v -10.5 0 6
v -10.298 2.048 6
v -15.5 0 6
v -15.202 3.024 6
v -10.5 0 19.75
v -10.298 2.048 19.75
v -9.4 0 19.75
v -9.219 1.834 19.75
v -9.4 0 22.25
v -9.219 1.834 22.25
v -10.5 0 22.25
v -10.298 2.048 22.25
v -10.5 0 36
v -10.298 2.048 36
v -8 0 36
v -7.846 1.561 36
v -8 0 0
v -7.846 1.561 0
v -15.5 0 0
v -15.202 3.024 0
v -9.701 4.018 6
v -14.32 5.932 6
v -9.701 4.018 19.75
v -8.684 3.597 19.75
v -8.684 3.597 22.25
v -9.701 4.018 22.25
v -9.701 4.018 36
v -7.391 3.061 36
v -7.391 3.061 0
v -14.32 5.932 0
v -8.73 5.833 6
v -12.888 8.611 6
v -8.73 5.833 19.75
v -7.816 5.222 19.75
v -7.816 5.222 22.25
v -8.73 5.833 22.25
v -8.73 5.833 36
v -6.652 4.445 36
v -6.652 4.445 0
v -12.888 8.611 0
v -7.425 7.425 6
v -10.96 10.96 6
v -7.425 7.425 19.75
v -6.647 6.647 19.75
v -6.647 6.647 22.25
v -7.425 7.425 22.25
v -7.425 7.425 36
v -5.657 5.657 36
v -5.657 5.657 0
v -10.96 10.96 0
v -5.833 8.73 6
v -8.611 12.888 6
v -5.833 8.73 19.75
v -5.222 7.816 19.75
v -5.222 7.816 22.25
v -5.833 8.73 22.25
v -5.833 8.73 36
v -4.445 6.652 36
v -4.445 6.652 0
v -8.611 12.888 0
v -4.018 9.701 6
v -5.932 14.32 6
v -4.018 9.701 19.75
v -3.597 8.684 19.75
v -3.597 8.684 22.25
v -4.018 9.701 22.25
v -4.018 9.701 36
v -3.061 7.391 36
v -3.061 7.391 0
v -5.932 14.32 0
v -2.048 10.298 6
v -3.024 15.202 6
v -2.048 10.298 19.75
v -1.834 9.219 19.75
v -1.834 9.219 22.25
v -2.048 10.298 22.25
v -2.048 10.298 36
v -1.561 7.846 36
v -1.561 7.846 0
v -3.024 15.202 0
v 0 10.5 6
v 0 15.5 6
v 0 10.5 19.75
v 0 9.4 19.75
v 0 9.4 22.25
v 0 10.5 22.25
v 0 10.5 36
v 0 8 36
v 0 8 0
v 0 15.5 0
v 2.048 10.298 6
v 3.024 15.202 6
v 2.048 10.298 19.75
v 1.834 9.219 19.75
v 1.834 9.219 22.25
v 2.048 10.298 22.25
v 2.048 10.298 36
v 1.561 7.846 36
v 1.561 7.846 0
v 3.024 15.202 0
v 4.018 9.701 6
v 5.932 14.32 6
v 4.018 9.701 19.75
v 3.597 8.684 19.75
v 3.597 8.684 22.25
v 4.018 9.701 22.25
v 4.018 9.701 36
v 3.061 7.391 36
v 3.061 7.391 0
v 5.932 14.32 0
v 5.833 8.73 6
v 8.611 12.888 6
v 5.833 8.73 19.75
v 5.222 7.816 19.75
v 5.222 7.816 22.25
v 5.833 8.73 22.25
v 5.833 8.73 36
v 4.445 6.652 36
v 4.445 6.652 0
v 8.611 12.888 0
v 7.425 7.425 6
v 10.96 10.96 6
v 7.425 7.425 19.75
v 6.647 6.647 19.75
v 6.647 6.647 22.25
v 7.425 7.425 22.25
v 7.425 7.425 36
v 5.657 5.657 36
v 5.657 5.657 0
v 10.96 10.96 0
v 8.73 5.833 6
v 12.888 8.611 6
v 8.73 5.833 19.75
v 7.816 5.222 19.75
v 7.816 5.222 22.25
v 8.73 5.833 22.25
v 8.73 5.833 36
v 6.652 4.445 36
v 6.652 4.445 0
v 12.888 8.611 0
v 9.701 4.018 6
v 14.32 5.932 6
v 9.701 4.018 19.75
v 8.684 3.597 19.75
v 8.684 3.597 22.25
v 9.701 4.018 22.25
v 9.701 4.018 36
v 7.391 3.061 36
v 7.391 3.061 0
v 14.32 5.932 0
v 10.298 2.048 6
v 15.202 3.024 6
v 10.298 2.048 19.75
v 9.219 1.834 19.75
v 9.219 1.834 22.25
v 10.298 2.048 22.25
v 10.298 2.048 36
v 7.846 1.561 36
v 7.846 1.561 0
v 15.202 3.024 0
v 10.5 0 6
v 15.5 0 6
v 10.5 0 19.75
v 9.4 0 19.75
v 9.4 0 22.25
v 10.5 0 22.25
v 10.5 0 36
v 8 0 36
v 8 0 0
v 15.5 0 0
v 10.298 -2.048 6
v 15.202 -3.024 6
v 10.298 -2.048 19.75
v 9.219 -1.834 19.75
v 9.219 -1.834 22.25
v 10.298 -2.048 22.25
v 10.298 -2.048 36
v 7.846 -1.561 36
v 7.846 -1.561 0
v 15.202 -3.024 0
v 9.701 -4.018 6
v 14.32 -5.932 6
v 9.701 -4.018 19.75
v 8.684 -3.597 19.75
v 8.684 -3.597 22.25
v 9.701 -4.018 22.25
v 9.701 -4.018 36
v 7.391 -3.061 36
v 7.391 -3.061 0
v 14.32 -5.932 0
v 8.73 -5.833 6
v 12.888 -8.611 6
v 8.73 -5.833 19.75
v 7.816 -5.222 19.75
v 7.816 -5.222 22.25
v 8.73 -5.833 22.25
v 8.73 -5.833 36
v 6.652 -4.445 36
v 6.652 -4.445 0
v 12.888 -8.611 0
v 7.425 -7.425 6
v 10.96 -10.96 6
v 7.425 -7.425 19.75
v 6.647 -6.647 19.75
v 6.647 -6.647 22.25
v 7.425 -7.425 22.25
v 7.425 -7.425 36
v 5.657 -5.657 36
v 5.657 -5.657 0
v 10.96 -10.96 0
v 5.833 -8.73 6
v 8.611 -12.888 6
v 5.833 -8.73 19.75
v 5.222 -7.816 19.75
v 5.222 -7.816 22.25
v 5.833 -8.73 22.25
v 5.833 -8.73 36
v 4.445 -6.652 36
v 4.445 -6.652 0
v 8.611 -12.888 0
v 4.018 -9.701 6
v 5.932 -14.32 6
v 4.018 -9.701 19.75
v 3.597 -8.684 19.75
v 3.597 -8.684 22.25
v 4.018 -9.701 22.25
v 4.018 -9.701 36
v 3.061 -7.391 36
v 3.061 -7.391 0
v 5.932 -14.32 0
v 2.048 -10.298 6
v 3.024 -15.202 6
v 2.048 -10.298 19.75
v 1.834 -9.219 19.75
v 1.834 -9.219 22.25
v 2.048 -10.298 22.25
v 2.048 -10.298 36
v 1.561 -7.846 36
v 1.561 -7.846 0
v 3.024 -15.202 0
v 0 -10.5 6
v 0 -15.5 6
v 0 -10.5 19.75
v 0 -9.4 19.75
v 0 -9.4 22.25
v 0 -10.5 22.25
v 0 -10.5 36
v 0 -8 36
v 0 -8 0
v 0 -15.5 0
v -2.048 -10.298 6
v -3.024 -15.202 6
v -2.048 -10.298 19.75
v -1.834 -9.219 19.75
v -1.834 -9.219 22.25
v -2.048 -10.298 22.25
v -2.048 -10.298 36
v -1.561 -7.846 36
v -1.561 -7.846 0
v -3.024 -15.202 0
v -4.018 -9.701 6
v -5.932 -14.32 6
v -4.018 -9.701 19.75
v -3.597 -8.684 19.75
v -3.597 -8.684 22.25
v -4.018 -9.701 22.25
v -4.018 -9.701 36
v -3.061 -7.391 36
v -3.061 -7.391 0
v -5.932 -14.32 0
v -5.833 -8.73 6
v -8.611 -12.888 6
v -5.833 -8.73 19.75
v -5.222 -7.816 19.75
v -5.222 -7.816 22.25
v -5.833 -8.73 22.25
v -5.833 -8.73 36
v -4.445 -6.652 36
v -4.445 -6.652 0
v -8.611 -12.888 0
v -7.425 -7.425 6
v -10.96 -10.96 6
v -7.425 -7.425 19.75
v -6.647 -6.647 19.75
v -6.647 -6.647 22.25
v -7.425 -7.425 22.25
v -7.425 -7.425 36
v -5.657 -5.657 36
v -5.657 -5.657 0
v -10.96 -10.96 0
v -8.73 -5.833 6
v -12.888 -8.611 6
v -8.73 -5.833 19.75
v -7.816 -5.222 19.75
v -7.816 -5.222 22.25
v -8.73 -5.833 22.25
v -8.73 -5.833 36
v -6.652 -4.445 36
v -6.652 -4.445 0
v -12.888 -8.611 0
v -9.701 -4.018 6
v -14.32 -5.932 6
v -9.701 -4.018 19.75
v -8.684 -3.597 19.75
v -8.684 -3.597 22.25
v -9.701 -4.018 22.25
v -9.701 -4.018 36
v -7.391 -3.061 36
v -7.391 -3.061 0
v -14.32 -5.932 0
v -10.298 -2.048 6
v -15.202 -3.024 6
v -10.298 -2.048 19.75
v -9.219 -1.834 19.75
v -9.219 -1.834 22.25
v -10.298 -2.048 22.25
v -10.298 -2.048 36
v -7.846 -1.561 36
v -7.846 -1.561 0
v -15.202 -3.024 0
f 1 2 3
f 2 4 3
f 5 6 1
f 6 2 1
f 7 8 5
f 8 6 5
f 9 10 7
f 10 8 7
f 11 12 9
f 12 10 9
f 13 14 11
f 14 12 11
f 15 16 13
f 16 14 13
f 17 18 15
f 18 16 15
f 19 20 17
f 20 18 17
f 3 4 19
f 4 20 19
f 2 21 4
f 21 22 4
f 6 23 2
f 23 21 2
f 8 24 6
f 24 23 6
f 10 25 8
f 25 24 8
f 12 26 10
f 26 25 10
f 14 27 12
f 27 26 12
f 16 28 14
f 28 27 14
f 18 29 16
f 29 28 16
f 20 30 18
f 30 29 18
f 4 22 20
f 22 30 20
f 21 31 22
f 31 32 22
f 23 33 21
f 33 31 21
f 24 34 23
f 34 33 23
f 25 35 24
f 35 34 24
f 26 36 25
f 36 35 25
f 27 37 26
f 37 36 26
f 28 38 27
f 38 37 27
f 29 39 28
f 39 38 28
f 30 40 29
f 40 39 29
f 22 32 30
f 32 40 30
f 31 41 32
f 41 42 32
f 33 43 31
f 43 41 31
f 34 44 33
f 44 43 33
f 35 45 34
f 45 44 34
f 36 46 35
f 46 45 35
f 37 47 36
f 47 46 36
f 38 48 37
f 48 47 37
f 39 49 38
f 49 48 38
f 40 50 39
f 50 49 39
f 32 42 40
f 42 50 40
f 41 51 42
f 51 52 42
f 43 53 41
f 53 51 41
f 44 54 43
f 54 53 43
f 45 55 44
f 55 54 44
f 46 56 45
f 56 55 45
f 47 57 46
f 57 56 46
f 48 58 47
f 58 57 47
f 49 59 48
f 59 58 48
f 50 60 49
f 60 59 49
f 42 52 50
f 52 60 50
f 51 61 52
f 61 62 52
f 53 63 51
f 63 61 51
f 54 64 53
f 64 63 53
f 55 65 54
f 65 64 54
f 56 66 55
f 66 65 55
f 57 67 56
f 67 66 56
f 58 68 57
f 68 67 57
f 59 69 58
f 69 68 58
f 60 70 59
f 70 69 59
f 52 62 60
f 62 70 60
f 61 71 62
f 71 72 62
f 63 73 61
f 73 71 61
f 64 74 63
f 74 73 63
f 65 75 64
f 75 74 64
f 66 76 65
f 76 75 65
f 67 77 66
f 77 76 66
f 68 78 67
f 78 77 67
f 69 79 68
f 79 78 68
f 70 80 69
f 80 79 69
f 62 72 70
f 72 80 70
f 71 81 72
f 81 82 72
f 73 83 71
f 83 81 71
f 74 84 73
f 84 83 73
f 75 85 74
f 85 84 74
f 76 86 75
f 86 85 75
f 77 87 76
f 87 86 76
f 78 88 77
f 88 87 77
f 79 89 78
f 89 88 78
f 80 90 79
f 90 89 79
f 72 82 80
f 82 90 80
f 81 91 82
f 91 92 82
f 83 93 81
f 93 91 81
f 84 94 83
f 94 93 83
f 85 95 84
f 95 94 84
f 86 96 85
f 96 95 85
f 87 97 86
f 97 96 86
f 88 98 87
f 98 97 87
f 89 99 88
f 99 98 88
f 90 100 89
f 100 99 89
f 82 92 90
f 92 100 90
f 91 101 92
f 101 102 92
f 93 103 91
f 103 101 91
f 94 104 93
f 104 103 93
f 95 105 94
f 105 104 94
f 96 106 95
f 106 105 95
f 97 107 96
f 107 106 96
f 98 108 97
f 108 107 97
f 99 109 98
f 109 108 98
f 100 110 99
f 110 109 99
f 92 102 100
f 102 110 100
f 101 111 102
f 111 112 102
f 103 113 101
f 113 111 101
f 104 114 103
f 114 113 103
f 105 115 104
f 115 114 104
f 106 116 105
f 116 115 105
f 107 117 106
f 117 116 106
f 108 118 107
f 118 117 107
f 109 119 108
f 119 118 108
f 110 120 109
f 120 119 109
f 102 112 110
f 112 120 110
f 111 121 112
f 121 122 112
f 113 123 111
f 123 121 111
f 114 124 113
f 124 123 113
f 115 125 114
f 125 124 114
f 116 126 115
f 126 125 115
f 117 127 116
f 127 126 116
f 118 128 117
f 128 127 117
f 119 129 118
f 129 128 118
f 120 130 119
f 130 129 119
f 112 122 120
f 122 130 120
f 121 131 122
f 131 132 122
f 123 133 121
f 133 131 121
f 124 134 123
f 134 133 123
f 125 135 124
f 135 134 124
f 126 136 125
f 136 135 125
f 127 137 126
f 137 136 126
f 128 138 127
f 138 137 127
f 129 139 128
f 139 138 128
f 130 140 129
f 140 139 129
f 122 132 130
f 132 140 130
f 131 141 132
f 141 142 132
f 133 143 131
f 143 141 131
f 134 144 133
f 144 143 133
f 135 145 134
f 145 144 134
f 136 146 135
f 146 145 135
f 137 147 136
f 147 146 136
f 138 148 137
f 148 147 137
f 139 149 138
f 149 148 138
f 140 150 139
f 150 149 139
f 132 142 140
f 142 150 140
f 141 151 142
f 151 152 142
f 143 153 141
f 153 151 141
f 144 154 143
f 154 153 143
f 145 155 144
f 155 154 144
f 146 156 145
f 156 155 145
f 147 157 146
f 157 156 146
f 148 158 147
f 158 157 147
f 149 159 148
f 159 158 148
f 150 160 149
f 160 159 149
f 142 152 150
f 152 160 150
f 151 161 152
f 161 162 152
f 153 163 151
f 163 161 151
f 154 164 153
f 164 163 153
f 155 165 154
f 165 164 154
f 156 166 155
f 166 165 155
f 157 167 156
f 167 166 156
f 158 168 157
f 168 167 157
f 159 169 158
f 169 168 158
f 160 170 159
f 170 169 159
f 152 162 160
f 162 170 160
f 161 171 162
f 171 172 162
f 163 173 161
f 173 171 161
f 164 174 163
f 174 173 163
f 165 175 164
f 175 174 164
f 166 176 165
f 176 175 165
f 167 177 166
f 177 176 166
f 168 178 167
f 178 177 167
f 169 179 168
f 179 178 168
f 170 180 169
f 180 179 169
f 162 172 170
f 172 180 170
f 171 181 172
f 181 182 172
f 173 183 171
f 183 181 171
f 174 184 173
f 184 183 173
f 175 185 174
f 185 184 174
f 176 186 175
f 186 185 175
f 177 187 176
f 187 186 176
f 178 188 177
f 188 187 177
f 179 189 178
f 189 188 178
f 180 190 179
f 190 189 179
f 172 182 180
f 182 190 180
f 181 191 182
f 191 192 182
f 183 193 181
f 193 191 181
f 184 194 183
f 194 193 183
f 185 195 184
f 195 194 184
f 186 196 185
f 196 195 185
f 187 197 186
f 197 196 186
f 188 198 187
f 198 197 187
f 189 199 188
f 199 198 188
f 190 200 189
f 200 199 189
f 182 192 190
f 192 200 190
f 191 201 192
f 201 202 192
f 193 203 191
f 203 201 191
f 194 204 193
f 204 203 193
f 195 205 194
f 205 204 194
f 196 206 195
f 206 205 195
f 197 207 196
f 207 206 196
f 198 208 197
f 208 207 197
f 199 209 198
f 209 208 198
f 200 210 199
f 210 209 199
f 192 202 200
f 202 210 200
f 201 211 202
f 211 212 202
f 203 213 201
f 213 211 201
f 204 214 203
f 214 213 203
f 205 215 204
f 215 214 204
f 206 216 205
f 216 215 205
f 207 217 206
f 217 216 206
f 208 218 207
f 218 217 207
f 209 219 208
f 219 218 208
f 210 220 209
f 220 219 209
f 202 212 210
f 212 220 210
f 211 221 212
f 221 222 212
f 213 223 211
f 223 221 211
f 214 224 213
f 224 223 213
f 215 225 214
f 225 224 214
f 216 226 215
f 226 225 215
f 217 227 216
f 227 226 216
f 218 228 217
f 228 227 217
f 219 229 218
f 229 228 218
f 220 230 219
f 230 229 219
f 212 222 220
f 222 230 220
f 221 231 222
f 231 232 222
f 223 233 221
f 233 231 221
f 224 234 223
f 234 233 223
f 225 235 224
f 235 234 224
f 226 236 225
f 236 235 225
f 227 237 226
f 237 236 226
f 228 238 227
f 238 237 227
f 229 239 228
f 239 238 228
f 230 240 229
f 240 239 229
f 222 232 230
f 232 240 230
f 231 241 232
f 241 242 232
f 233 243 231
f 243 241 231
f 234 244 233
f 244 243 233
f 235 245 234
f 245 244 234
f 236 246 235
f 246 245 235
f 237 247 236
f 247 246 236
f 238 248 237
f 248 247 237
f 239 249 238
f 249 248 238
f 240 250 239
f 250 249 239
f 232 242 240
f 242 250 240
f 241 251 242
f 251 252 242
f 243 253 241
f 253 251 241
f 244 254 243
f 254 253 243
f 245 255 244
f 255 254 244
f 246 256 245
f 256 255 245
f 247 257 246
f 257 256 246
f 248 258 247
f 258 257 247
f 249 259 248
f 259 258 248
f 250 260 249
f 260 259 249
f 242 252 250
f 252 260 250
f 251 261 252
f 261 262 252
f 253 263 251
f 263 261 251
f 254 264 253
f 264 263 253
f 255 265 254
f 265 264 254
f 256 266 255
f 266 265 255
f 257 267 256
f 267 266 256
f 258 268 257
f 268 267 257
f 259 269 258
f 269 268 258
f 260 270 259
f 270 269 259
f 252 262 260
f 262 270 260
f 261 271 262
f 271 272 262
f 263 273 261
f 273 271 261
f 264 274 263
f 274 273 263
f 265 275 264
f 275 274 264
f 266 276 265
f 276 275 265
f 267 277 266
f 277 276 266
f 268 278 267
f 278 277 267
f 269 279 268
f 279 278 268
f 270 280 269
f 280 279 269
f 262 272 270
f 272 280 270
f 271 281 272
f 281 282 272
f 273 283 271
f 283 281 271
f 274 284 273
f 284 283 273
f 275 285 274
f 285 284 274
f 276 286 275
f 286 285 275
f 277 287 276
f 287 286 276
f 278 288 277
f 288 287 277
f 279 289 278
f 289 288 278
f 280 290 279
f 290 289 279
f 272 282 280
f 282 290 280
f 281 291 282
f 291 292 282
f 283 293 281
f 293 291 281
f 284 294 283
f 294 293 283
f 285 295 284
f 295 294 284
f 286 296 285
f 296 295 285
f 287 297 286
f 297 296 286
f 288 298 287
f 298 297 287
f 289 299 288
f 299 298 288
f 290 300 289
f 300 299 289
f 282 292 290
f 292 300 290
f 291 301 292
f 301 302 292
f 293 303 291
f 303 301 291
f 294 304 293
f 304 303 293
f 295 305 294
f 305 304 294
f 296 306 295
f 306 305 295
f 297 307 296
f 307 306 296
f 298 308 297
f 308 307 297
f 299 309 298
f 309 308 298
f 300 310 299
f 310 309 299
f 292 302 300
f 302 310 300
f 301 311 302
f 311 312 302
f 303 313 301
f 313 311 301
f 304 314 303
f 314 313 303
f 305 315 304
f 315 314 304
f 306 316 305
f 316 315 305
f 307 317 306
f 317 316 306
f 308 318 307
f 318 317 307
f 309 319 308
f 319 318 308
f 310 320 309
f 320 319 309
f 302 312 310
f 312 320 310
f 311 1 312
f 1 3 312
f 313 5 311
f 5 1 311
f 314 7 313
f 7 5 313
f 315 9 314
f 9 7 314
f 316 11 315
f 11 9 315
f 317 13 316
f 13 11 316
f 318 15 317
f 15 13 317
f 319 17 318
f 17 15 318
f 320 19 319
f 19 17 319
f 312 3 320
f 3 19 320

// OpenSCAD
$fn = 32;

// ----------------------------------------------------------------------
// Grooved revolve: flanged, bore R8
// ----------------------------------------------------------------------

// --- parameters (mm) ---
bore_r = 8;               // bore radius
outer_r = 10.5;           // outer radius of the body
total_h = 36;             // overall height, Z
wall = 2.5;               // radial wall thickness
groove_w = 2.5;           // groove width
groove_d = 1.1;           // groove depth
grooves = 1;              // number of outer grooves
flange_r = 15.5;          // flange radius
flange_h = 6;             // flange height

bbox_x = 2 * flange_r;  // full diameter
bore_d = 2 * bore_r;  // bore diameter
body_d = 2 * outer_r;  // body diameter
flange_d = 2 * flange_r;  // flange diameter
revolve_angle = 360;  // full turn around the Z axis

profile = [[8, 0], [10.5, 0], [15.5, 0], [15.5, 6], [10.5, 6], [10.5, 19.75], [9.4, 19.75], [9.4, 22.25], [10.5, 22.25], [10.5, 36], [8, 36]];  // primary outline, 11 points, counter clockwise

// --- the one profile operation ---
rotate_extrude(angle = revolve_angle) polygon(points = profile);
